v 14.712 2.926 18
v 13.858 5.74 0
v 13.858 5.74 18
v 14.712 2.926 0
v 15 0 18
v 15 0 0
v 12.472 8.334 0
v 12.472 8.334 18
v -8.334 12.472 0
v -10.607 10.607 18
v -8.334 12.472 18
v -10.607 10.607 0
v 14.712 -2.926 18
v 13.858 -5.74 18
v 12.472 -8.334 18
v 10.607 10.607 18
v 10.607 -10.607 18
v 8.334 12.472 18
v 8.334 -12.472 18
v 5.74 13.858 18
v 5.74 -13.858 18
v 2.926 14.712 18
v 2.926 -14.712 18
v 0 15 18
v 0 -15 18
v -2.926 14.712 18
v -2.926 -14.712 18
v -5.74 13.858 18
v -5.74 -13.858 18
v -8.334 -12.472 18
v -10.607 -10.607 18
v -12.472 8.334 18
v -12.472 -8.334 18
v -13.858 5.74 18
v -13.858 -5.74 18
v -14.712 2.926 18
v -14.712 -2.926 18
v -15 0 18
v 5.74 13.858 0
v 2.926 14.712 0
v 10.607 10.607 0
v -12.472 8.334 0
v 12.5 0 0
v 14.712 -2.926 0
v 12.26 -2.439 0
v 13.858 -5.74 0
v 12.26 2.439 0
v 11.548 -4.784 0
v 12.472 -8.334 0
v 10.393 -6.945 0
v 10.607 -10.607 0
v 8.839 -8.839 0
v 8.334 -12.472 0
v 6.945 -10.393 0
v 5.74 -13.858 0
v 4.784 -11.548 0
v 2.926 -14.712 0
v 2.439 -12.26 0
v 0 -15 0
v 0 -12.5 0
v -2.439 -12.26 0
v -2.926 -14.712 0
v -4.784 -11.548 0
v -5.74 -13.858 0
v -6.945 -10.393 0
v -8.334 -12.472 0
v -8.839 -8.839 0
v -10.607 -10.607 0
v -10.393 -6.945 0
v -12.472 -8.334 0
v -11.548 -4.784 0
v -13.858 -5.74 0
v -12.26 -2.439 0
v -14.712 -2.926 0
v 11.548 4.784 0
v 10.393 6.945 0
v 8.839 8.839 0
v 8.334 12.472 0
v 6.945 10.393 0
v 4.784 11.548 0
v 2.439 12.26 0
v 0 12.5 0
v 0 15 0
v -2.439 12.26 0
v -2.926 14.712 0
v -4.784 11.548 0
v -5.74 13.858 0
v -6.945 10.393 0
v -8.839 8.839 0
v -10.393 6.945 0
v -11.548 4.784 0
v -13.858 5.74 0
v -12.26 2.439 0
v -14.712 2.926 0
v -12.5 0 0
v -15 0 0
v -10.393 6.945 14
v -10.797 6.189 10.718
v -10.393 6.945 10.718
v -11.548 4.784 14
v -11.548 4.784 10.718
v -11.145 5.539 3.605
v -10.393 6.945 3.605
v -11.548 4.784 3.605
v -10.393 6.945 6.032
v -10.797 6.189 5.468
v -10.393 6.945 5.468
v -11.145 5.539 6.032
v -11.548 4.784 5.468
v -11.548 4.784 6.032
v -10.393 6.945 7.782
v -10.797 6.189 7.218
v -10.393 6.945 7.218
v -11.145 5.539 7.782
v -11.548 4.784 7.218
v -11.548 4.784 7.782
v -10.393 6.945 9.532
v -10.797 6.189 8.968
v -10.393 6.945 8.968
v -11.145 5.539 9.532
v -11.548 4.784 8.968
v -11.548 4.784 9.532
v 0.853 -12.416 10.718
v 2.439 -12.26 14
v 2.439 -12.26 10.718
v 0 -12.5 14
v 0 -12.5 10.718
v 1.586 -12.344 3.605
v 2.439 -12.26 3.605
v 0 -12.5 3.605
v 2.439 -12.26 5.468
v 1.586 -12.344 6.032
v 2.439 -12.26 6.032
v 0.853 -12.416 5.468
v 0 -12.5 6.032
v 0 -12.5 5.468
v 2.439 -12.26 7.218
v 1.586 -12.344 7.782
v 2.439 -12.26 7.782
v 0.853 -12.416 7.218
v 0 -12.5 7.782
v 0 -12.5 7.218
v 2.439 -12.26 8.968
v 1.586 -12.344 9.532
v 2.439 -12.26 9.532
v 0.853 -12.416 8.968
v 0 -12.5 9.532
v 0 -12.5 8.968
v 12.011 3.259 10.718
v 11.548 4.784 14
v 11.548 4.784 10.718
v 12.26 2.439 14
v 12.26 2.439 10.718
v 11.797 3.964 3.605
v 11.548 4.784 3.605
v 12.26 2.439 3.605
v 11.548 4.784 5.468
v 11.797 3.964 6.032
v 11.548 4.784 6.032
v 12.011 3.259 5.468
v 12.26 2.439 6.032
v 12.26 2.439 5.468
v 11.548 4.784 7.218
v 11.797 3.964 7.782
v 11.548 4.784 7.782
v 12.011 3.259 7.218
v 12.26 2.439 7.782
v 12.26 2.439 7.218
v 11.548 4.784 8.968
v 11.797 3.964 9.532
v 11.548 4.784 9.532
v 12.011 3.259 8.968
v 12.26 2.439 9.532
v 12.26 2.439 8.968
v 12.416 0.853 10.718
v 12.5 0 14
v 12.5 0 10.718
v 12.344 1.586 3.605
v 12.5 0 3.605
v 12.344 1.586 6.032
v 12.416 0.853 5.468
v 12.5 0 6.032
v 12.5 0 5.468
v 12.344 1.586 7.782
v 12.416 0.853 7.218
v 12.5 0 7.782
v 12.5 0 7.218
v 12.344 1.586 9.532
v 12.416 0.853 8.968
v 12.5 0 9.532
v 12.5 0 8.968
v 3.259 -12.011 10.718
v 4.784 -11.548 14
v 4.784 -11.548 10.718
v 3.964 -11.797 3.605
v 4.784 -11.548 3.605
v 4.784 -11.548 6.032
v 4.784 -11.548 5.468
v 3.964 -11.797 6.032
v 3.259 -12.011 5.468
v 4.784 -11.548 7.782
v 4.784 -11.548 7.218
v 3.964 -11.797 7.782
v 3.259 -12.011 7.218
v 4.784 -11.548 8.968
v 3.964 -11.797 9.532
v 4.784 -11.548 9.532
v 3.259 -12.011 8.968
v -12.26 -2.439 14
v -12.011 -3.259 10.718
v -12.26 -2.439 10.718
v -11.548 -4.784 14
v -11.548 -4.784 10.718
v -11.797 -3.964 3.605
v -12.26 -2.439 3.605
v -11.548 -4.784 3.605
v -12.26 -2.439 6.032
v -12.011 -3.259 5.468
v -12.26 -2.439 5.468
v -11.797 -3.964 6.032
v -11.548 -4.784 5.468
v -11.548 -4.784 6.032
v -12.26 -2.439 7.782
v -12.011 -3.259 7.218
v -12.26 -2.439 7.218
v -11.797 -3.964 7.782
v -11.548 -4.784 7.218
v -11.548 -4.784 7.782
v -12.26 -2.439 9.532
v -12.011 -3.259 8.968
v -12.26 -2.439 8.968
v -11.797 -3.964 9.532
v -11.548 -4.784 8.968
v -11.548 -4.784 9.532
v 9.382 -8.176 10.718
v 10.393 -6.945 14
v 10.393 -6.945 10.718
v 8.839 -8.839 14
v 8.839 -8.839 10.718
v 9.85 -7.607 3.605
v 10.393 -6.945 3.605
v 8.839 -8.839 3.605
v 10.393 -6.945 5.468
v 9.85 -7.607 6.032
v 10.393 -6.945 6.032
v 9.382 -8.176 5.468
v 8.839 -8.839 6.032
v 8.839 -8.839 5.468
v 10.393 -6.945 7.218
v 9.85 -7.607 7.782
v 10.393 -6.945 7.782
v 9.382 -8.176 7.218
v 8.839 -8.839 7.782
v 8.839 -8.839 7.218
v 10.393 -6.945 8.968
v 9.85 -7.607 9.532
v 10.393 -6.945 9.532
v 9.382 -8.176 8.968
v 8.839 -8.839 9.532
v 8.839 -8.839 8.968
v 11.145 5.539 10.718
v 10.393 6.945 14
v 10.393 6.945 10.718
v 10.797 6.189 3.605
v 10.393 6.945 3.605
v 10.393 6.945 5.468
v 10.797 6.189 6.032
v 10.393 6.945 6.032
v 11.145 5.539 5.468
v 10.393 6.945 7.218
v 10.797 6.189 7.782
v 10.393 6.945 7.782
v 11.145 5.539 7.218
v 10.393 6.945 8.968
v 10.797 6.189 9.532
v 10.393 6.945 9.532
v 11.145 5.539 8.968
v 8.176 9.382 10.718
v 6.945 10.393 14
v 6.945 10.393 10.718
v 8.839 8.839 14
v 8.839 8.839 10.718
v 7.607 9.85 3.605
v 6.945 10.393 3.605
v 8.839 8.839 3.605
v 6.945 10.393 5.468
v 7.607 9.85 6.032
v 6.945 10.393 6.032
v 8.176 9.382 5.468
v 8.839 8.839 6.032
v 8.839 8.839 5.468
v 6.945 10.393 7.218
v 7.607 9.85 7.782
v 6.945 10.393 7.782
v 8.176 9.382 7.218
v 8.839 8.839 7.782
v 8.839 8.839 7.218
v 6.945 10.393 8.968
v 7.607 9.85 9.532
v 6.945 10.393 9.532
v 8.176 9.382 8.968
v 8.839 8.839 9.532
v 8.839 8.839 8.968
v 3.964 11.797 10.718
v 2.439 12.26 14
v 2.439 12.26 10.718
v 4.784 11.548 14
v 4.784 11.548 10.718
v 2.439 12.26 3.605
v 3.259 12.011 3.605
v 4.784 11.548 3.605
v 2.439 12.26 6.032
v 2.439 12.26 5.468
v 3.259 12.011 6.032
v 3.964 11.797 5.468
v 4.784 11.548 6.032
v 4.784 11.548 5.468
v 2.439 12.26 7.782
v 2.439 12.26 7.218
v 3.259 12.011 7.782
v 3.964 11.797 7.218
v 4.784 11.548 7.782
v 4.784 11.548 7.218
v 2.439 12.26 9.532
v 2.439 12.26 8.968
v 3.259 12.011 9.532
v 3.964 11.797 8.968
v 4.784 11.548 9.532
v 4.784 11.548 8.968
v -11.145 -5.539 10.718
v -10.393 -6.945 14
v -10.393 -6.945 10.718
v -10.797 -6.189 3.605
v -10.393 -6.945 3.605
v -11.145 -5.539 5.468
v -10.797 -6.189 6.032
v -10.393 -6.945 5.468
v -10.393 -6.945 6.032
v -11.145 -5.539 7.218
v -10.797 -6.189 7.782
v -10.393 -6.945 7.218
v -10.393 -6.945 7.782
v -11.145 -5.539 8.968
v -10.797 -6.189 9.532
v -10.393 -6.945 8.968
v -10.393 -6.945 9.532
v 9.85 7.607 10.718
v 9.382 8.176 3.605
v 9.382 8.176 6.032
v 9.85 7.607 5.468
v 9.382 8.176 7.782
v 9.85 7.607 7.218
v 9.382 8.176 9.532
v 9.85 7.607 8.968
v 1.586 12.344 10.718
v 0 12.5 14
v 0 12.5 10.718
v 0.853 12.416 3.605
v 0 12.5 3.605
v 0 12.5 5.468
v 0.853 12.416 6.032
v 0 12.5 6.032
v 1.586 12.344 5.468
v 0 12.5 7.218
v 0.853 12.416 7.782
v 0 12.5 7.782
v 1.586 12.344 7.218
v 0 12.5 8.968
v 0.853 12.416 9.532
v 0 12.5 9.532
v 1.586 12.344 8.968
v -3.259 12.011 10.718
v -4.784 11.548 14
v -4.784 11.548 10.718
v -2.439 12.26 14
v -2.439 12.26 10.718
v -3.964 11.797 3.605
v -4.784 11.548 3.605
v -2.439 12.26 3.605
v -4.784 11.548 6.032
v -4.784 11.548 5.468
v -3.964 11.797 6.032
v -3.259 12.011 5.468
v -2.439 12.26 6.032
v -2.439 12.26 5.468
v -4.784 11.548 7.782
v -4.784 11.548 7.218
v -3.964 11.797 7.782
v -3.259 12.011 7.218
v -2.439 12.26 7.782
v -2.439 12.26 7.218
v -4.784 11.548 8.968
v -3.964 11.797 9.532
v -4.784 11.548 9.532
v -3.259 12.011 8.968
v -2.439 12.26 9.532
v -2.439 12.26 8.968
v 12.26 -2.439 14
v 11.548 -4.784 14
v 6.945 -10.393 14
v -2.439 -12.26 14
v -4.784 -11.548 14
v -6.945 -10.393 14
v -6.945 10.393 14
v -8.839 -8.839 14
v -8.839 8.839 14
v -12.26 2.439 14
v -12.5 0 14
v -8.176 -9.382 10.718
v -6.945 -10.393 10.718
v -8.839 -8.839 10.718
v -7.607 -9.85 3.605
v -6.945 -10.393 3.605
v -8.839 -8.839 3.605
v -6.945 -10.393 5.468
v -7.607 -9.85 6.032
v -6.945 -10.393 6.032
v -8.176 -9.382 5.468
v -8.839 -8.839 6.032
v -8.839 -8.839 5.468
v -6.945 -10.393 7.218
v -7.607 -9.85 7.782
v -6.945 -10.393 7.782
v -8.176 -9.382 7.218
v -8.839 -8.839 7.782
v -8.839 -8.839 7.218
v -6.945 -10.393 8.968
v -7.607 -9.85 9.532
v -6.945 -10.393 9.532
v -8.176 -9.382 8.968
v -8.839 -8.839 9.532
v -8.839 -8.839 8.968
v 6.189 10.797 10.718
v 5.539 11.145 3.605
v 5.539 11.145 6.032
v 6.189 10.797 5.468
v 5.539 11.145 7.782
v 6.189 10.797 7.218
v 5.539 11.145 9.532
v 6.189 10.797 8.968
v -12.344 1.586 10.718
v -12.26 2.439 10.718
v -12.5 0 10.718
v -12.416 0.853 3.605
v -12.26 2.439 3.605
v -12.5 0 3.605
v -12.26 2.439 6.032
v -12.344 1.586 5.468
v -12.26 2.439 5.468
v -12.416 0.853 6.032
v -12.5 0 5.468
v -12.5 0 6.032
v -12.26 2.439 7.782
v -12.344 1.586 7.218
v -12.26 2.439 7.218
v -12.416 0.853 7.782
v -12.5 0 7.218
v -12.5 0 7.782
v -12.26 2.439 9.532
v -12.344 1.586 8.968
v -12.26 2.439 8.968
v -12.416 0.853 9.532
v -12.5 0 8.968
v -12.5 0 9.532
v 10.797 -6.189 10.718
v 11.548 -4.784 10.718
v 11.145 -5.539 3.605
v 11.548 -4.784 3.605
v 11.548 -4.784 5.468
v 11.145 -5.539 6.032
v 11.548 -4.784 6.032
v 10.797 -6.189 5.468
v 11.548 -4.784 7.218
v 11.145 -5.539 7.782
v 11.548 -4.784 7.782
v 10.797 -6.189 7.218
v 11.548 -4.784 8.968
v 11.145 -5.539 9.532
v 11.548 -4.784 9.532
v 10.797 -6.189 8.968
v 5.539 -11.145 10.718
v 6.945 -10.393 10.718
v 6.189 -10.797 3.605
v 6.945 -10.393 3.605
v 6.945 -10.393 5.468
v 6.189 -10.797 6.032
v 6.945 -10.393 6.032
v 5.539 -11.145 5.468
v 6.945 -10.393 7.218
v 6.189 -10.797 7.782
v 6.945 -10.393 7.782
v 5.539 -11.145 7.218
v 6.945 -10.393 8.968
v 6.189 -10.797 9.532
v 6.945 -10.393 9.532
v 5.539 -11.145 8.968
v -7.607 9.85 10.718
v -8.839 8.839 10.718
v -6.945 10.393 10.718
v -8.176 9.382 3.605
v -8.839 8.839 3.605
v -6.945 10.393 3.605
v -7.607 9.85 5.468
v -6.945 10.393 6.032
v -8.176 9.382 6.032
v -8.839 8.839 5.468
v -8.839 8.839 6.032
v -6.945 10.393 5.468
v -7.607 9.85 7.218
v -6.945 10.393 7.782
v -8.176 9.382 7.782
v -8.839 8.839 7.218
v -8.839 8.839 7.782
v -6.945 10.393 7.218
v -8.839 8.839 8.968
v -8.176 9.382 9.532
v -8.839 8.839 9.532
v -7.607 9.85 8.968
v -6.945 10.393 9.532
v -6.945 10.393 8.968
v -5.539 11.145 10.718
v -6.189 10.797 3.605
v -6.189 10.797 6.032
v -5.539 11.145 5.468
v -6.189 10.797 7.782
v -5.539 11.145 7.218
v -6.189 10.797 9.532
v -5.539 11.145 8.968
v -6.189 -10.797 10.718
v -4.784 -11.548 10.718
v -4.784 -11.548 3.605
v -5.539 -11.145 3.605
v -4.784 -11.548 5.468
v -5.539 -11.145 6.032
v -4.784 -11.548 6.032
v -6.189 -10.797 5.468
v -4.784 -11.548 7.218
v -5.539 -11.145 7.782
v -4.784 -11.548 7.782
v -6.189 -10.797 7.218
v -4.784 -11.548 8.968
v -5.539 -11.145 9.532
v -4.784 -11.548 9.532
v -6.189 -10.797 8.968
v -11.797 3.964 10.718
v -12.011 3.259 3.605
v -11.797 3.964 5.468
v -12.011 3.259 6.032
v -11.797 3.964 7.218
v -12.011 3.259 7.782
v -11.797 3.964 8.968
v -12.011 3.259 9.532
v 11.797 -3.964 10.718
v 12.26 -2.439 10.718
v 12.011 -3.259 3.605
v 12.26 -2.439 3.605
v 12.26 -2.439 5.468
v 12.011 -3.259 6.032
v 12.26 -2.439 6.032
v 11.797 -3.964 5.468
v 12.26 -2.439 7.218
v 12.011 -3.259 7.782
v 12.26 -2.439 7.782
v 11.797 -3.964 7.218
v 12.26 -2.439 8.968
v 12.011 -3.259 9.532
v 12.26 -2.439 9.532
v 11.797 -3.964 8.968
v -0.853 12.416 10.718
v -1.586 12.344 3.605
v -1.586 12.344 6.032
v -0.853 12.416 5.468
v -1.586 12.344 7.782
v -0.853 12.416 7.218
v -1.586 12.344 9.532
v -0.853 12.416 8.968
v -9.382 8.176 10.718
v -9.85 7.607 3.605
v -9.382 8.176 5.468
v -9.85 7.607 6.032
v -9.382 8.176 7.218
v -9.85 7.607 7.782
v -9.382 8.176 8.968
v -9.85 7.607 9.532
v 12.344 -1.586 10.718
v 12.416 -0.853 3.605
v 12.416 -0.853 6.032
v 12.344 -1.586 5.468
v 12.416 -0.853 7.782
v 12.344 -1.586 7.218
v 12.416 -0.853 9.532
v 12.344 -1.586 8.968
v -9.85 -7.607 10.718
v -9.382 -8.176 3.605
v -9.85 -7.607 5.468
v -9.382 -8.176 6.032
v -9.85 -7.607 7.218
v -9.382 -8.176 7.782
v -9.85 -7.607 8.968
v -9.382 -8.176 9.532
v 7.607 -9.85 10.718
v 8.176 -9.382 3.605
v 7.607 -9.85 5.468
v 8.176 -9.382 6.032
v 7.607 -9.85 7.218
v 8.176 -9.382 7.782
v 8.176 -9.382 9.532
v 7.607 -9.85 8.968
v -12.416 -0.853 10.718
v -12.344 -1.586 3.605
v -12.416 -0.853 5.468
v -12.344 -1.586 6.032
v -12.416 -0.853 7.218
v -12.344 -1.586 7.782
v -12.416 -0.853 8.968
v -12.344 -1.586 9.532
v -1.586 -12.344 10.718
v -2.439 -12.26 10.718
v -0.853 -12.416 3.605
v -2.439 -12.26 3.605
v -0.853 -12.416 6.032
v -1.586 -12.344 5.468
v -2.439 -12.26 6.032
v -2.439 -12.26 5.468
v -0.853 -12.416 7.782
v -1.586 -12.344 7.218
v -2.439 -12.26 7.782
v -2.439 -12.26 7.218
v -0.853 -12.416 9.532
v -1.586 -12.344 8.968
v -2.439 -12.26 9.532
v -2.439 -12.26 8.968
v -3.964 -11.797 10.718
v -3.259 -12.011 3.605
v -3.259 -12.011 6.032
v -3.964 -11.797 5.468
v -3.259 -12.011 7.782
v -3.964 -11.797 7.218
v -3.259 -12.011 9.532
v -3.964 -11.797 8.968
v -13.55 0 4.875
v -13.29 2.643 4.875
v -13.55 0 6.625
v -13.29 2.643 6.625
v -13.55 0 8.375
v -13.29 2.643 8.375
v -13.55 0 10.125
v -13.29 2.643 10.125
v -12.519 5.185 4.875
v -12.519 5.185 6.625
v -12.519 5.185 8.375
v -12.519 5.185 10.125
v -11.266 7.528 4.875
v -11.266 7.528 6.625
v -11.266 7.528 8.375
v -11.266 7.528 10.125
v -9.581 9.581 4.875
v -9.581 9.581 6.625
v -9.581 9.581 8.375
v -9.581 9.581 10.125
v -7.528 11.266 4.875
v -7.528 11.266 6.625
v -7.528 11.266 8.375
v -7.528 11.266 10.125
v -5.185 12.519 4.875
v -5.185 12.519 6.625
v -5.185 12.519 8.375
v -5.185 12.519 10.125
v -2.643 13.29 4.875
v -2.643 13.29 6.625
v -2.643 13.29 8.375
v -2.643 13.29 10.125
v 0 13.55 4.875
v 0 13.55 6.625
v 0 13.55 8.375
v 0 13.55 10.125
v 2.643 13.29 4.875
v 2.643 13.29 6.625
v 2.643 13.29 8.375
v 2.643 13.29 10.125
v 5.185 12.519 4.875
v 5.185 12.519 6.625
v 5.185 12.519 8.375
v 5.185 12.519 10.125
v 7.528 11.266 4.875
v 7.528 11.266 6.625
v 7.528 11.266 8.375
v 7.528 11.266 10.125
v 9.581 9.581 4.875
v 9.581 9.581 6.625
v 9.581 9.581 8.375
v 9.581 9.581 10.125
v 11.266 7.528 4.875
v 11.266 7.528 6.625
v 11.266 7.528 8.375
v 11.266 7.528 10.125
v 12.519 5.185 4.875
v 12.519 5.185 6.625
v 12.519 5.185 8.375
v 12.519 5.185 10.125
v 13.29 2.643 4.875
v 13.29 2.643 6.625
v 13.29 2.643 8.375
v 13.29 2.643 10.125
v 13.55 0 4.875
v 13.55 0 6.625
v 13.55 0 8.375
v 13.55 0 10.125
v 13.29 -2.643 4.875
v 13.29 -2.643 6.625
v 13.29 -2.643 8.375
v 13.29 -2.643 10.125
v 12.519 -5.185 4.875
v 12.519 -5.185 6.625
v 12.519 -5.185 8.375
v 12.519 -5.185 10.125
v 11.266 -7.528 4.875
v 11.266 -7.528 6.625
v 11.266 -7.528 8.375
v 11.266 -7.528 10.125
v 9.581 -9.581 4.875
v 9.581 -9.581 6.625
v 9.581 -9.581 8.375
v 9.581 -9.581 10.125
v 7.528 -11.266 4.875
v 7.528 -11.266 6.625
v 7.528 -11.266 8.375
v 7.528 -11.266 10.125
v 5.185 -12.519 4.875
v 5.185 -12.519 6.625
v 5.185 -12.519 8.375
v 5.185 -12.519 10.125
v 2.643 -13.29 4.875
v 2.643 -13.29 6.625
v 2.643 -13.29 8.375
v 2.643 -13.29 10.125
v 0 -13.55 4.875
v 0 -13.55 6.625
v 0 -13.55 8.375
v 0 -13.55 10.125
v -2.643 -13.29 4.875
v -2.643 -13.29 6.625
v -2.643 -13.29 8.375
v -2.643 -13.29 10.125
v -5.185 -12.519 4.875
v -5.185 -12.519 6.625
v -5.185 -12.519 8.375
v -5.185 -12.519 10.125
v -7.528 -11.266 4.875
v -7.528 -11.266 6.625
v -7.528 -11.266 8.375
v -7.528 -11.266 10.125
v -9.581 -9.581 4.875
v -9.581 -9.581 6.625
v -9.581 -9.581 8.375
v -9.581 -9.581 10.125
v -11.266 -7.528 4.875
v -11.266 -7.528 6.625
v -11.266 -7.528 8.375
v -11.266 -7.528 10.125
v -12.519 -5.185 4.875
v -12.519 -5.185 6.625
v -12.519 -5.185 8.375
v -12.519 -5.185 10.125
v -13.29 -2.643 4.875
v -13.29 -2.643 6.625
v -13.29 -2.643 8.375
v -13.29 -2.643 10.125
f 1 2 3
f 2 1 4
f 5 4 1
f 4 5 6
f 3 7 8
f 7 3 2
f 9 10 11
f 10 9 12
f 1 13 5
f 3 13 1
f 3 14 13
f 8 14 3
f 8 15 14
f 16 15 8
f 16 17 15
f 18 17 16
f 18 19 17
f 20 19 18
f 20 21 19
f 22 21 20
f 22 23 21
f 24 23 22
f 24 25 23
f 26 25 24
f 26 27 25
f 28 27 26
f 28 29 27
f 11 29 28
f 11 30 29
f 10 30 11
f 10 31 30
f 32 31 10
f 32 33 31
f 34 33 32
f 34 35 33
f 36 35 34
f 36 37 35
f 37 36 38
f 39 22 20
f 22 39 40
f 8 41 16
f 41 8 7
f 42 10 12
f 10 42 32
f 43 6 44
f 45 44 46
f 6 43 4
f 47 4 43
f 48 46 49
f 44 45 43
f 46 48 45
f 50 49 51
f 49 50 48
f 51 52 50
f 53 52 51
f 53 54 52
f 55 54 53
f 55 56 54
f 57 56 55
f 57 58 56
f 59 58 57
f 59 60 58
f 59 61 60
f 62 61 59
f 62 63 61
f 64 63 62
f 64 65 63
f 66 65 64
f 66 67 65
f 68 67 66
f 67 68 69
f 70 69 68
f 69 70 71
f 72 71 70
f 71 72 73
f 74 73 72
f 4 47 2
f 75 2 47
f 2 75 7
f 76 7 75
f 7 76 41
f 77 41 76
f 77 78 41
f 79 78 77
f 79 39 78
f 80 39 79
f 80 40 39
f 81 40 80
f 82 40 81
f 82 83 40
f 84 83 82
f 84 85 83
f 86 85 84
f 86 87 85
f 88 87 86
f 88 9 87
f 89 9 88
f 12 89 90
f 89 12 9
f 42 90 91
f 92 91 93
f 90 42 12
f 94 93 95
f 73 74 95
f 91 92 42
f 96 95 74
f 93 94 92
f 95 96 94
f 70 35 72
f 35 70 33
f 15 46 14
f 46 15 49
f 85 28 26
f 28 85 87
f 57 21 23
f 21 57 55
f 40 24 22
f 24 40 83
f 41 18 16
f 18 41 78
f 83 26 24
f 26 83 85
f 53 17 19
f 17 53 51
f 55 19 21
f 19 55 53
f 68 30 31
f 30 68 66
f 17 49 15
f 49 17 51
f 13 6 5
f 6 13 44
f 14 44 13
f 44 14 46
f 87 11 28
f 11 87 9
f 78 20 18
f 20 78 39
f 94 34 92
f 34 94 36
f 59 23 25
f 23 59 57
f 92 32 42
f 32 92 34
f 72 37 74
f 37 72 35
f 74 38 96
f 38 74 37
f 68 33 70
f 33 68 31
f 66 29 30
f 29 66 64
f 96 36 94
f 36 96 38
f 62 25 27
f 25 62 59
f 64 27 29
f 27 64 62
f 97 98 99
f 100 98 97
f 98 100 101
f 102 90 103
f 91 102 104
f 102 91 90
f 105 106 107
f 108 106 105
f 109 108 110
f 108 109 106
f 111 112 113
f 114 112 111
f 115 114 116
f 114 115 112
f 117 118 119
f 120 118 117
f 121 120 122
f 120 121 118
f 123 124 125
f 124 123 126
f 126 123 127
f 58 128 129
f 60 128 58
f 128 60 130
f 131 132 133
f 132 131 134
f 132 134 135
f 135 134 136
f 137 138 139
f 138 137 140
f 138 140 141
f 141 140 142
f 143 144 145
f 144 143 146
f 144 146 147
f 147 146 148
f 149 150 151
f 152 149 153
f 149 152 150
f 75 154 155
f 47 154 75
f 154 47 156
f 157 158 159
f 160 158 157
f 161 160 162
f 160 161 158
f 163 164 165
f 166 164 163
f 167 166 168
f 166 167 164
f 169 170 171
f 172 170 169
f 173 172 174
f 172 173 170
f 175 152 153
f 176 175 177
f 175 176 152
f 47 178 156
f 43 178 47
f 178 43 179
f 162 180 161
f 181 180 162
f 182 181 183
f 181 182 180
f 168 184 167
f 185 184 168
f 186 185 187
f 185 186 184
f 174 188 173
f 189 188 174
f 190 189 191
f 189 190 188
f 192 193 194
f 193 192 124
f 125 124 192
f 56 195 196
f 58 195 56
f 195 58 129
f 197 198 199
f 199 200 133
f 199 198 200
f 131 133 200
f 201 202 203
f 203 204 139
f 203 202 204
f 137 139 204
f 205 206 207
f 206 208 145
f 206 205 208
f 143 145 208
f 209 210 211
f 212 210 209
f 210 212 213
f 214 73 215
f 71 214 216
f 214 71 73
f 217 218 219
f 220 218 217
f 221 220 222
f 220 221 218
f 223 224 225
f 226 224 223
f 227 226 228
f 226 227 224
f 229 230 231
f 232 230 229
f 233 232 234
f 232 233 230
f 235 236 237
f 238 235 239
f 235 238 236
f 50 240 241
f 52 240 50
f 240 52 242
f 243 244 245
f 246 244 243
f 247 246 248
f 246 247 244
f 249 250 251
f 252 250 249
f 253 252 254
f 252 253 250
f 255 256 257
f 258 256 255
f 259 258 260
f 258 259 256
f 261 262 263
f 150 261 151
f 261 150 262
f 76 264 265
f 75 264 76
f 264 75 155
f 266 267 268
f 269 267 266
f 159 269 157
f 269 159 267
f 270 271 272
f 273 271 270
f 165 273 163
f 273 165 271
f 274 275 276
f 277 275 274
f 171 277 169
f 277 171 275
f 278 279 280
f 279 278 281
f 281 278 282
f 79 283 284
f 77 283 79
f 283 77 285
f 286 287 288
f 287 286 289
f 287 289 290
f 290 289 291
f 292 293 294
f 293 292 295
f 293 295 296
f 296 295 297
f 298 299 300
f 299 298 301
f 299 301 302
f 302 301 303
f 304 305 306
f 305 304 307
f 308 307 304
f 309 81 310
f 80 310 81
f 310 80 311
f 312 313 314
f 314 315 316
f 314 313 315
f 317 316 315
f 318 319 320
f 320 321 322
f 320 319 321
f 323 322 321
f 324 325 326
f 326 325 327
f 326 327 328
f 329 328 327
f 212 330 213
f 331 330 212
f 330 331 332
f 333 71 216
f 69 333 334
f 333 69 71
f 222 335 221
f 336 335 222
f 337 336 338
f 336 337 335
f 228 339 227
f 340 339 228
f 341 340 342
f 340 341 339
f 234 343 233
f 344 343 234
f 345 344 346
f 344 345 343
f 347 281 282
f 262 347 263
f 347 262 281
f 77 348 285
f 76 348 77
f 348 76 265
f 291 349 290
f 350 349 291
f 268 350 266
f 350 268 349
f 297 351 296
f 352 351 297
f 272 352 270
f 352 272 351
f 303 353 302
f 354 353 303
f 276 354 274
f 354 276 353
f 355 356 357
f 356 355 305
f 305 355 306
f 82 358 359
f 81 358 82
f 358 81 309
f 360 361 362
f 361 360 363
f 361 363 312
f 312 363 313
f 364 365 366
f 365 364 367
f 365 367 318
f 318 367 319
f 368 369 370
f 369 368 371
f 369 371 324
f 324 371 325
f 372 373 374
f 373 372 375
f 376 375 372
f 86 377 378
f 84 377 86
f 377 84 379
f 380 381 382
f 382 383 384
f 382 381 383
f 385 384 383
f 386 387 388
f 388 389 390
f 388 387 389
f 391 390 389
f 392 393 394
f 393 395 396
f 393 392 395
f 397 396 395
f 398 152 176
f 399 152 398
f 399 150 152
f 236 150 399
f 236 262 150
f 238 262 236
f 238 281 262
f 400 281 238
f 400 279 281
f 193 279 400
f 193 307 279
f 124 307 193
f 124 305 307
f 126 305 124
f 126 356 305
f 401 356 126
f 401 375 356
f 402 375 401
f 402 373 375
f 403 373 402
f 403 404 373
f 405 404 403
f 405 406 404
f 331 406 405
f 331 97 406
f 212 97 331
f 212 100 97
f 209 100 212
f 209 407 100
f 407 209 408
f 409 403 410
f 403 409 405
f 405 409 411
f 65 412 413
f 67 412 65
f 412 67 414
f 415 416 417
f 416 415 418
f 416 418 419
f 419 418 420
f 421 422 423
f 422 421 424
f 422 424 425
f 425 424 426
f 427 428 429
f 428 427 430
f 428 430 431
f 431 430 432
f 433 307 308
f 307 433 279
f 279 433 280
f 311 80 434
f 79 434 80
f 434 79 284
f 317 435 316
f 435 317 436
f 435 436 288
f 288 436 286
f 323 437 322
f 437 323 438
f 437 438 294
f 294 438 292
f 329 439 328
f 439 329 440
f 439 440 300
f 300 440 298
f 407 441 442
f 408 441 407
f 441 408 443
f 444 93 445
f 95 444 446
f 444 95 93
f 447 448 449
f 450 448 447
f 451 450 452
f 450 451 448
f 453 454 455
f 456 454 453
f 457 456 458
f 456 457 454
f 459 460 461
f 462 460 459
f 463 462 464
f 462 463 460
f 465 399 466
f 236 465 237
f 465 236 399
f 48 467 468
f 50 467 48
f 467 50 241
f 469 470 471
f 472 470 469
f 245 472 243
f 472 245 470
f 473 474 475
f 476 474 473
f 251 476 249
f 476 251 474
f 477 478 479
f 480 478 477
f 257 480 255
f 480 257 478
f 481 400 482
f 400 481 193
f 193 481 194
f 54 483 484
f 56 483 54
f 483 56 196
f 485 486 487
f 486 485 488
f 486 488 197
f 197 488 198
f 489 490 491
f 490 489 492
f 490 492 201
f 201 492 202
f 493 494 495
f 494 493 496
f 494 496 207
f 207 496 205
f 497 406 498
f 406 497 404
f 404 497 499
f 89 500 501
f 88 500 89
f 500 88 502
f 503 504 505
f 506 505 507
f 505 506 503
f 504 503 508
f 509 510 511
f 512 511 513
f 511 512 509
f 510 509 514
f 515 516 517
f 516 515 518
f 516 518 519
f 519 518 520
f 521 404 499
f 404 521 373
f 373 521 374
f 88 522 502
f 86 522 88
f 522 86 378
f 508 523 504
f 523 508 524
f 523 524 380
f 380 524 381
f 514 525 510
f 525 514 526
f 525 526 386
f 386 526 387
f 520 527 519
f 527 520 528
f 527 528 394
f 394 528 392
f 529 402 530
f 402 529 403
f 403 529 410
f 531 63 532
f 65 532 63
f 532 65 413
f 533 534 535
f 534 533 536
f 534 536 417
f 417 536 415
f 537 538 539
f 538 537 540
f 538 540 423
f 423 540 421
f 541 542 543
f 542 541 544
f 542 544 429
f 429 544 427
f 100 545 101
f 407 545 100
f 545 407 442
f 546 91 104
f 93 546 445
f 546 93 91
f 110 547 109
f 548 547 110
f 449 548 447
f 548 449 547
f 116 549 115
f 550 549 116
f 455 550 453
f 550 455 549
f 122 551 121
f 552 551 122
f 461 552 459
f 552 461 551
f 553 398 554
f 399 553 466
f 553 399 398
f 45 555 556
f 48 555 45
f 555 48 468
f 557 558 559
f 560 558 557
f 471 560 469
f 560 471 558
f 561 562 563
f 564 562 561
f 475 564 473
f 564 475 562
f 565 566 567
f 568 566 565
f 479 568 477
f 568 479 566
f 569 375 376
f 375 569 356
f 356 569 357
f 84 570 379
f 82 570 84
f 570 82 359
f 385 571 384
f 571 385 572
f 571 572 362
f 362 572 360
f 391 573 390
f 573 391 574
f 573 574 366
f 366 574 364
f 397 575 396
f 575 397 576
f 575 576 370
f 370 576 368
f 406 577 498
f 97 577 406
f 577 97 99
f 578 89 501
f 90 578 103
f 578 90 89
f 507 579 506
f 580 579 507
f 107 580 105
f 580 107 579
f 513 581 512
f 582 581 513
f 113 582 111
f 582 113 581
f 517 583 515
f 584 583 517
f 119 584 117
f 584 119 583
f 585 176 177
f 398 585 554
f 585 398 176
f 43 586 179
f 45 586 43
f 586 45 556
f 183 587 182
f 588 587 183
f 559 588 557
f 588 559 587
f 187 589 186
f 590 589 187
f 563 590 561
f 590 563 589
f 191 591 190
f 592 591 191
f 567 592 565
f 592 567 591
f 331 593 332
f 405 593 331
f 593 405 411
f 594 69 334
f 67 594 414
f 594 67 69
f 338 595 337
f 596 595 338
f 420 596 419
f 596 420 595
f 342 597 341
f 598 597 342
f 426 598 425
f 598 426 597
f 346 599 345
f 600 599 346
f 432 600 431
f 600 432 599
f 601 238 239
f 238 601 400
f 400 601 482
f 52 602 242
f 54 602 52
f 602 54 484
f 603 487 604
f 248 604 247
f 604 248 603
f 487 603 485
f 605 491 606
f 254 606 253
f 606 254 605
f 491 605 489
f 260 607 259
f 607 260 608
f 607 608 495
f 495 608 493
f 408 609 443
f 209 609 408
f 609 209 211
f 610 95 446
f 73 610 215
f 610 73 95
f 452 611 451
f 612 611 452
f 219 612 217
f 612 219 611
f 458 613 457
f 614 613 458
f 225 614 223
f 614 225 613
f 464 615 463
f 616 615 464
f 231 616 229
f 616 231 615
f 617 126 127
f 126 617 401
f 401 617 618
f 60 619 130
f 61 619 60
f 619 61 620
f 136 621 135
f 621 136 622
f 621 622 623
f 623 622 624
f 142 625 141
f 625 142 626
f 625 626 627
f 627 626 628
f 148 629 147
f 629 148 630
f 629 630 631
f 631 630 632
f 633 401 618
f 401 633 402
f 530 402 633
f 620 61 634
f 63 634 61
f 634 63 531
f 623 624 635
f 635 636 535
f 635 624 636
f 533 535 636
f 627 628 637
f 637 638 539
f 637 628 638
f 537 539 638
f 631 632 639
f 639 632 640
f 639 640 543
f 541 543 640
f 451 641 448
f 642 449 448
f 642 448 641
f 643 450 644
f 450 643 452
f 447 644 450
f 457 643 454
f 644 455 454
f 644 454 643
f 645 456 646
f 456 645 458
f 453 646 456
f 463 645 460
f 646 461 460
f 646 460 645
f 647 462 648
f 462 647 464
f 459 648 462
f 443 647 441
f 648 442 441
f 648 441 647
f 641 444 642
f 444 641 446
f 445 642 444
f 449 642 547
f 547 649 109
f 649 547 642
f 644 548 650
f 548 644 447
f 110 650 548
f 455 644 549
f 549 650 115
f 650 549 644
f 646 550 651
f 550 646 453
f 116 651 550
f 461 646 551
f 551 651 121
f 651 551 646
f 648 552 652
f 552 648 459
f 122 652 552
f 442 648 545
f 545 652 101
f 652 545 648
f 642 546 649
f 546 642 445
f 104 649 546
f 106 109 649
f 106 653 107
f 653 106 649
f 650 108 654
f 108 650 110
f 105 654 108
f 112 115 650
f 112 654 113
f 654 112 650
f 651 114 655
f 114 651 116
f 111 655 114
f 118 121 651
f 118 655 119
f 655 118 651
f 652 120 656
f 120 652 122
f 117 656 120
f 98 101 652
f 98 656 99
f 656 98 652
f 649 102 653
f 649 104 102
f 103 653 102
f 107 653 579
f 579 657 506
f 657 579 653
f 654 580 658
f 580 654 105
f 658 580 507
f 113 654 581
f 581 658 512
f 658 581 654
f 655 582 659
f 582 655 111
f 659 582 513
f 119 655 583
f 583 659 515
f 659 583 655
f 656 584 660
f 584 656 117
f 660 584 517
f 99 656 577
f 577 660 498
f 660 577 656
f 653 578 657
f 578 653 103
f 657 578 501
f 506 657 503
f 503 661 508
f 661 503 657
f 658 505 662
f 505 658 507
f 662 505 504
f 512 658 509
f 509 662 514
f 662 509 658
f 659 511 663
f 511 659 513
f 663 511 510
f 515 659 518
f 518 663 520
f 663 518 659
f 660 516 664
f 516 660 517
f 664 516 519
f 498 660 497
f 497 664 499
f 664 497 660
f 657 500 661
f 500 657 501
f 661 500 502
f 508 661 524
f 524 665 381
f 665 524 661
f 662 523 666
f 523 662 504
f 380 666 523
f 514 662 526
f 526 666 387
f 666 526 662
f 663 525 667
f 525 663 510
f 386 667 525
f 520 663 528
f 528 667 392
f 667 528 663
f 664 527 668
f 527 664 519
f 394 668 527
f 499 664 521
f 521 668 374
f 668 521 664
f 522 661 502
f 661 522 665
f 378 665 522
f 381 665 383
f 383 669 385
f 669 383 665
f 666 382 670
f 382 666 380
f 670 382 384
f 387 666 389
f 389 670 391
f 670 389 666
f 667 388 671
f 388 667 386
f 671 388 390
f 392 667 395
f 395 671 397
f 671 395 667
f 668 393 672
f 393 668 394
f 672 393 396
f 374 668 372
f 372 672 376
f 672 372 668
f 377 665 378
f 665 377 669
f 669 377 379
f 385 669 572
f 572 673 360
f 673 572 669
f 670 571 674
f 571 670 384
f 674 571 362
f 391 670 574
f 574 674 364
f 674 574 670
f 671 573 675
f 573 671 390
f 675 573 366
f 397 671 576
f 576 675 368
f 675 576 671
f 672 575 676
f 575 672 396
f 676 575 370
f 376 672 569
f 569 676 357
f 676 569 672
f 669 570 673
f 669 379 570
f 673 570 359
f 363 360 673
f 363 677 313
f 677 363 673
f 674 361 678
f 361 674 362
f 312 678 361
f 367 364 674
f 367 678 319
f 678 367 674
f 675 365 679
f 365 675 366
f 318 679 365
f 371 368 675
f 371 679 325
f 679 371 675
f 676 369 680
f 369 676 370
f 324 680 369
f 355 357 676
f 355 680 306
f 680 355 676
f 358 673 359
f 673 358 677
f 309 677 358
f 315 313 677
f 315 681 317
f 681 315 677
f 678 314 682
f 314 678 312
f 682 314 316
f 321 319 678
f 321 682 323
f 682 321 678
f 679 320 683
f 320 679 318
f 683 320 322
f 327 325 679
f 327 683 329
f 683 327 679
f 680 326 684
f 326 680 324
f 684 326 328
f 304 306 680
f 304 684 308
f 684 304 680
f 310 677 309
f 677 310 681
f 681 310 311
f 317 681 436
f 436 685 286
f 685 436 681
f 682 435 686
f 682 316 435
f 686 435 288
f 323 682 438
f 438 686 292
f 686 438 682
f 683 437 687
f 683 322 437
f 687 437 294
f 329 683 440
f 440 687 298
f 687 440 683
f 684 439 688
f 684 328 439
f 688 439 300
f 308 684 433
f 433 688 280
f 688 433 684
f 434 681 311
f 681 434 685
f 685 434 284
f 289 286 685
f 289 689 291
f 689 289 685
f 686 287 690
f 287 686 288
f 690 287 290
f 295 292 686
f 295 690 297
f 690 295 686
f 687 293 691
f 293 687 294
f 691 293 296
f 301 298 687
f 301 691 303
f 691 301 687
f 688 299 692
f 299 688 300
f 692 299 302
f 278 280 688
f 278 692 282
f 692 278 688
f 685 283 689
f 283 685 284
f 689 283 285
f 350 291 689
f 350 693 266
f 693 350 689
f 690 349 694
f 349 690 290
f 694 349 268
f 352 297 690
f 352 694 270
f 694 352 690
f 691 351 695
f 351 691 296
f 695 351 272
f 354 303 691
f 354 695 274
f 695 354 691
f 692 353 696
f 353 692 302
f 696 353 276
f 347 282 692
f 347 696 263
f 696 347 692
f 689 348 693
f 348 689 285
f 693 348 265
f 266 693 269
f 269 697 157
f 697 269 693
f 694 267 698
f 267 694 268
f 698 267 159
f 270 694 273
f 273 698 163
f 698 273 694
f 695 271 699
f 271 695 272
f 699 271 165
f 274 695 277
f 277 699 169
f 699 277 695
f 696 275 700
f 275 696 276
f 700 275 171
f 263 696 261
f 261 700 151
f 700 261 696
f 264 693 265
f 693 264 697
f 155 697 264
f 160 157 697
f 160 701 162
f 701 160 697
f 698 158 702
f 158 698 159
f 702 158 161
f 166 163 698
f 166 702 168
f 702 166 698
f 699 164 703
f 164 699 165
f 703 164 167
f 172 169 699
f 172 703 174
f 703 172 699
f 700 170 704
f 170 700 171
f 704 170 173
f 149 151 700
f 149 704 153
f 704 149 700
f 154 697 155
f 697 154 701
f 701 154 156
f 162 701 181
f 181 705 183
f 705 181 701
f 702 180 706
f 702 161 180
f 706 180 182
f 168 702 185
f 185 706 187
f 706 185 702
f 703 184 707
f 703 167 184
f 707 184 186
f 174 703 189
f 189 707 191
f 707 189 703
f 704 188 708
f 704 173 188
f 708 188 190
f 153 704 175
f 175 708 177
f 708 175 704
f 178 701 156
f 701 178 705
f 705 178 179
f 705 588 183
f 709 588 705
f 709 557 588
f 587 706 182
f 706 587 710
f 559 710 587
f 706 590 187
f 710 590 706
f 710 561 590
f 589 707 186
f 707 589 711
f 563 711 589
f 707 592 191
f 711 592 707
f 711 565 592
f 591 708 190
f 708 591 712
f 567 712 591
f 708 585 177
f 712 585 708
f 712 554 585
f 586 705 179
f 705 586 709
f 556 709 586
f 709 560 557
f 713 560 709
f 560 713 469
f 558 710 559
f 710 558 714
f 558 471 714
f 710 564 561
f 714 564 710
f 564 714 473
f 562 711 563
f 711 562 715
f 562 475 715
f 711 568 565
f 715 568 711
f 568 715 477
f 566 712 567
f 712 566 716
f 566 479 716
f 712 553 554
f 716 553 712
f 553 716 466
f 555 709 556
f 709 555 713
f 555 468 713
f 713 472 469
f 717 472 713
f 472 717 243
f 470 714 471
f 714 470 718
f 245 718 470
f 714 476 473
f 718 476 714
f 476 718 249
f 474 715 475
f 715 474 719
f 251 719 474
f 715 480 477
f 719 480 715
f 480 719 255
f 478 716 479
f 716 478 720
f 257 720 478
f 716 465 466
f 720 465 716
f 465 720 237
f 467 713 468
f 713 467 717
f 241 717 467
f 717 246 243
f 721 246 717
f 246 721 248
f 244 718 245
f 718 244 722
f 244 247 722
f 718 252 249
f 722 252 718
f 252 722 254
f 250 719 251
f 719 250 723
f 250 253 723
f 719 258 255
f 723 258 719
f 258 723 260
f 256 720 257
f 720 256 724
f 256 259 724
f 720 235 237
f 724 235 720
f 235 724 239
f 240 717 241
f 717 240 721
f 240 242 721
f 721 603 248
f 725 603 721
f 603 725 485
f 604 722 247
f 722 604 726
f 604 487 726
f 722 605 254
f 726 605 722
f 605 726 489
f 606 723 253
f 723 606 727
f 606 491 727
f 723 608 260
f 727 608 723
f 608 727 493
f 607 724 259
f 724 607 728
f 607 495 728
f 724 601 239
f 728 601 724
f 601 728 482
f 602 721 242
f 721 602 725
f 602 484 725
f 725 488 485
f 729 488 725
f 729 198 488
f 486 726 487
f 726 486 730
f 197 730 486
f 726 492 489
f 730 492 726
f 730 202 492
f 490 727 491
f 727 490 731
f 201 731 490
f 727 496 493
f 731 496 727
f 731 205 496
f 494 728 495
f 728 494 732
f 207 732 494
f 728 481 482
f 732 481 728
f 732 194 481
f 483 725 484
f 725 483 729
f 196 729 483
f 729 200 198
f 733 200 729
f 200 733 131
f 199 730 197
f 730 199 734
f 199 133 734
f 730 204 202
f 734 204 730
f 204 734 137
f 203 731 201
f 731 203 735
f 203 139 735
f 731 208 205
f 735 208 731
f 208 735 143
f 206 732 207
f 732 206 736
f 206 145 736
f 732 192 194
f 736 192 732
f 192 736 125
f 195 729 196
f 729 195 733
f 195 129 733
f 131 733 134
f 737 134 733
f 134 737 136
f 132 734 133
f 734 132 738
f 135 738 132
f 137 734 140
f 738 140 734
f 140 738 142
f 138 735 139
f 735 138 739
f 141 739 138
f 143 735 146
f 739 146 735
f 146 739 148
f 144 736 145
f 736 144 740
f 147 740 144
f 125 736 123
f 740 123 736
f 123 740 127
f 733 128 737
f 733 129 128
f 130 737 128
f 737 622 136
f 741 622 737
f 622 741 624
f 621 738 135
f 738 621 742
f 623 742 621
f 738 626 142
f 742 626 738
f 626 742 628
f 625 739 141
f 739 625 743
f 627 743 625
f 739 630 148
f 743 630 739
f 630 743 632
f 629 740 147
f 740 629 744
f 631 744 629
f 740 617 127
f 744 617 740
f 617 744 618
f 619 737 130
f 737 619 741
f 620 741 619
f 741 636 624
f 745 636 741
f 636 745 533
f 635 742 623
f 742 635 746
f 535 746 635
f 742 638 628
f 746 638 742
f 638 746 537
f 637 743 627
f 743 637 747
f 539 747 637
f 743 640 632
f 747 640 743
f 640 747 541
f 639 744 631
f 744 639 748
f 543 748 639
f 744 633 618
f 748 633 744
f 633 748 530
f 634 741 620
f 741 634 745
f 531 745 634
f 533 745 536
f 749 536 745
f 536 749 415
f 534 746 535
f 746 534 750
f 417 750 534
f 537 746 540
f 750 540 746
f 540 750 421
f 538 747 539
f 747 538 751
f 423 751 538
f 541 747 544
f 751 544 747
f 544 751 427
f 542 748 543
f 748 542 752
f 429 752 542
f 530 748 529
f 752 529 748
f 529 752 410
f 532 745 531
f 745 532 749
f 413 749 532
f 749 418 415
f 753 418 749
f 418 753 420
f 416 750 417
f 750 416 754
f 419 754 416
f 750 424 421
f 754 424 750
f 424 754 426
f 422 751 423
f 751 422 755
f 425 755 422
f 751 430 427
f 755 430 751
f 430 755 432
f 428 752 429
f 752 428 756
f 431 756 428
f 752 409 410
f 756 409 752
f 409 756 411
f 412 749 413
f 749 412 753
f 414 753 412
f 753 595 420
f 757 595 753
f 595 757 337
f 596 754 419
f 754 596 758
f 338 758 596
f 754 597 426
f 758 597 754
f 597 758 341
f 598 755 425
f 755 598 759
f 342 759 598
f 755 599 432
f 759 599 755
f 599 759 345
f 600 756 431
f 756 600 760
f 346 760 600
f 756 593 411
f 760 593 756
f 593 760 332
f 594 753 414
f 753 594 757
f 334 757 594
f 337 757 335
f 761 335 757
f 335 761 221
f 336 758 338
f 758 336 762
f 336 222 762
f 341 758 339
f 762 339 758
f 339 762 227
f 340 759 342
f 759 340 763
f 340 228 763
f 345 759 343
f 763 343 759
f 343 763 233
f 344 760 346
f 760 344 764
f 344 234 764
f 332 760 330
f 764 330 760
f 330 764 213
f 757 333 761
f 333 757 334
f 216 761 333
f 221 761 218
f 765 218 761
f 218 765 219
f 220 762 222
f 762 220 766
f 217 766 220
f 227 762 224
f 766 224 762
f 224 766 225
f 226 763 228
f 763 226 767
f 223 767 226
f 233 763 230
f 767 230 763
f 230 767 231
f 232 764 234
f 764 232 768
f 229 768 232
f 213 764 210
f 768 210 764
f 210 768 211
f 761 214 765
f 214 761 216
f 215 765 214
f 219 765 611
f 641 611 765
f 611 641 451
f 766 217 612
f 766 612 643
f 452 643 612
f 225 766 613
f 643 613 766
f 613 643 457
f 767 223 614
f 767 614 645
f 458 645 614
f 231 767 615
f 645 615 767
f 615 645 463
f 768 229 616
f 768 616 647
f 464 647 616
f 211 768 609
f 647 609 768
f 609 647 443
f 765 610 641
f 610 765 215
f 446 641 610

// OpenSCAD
$fn = 32;

// ----------------------------------------------------------------------
// Threaded cap: 30 mm body, 18 mm tall, 25 mm threaded bore
// ----------------------------------------------------------------------

// --- parameters (mm) ---
outer_d = 30;             // cap outside diameter
body_h = 18;              // cap height
top_t = 4;                // closed top thickness
bore_d = 25;              // bore core diameter
pitch = 1.75;             // thread pitch
thread_d = 1.05;          // thread depth
thread_z = 3;             // thread start above the rim
thread_h = 8;             // threaded height

difference() {
  union() {
    cylinder(h = 18, d = outer_d);
  }
  /* threaded bore, closed at the top */
  translate([0, 0, -2.5]) cylinder(h = 16.5, d = bore_d);
  translate([0, 0, 3]) rotate_extrude() polygon([[11.5, 0], [11.5, 8], [12, 8], [13.55, 7.125], [12, 6.25], [13.55, 5.375], [12, 4.5], [13.55, 3.625], [12, 2.75], [13.55, 1.875], [12, 0], [11.5, 0]]);
}
